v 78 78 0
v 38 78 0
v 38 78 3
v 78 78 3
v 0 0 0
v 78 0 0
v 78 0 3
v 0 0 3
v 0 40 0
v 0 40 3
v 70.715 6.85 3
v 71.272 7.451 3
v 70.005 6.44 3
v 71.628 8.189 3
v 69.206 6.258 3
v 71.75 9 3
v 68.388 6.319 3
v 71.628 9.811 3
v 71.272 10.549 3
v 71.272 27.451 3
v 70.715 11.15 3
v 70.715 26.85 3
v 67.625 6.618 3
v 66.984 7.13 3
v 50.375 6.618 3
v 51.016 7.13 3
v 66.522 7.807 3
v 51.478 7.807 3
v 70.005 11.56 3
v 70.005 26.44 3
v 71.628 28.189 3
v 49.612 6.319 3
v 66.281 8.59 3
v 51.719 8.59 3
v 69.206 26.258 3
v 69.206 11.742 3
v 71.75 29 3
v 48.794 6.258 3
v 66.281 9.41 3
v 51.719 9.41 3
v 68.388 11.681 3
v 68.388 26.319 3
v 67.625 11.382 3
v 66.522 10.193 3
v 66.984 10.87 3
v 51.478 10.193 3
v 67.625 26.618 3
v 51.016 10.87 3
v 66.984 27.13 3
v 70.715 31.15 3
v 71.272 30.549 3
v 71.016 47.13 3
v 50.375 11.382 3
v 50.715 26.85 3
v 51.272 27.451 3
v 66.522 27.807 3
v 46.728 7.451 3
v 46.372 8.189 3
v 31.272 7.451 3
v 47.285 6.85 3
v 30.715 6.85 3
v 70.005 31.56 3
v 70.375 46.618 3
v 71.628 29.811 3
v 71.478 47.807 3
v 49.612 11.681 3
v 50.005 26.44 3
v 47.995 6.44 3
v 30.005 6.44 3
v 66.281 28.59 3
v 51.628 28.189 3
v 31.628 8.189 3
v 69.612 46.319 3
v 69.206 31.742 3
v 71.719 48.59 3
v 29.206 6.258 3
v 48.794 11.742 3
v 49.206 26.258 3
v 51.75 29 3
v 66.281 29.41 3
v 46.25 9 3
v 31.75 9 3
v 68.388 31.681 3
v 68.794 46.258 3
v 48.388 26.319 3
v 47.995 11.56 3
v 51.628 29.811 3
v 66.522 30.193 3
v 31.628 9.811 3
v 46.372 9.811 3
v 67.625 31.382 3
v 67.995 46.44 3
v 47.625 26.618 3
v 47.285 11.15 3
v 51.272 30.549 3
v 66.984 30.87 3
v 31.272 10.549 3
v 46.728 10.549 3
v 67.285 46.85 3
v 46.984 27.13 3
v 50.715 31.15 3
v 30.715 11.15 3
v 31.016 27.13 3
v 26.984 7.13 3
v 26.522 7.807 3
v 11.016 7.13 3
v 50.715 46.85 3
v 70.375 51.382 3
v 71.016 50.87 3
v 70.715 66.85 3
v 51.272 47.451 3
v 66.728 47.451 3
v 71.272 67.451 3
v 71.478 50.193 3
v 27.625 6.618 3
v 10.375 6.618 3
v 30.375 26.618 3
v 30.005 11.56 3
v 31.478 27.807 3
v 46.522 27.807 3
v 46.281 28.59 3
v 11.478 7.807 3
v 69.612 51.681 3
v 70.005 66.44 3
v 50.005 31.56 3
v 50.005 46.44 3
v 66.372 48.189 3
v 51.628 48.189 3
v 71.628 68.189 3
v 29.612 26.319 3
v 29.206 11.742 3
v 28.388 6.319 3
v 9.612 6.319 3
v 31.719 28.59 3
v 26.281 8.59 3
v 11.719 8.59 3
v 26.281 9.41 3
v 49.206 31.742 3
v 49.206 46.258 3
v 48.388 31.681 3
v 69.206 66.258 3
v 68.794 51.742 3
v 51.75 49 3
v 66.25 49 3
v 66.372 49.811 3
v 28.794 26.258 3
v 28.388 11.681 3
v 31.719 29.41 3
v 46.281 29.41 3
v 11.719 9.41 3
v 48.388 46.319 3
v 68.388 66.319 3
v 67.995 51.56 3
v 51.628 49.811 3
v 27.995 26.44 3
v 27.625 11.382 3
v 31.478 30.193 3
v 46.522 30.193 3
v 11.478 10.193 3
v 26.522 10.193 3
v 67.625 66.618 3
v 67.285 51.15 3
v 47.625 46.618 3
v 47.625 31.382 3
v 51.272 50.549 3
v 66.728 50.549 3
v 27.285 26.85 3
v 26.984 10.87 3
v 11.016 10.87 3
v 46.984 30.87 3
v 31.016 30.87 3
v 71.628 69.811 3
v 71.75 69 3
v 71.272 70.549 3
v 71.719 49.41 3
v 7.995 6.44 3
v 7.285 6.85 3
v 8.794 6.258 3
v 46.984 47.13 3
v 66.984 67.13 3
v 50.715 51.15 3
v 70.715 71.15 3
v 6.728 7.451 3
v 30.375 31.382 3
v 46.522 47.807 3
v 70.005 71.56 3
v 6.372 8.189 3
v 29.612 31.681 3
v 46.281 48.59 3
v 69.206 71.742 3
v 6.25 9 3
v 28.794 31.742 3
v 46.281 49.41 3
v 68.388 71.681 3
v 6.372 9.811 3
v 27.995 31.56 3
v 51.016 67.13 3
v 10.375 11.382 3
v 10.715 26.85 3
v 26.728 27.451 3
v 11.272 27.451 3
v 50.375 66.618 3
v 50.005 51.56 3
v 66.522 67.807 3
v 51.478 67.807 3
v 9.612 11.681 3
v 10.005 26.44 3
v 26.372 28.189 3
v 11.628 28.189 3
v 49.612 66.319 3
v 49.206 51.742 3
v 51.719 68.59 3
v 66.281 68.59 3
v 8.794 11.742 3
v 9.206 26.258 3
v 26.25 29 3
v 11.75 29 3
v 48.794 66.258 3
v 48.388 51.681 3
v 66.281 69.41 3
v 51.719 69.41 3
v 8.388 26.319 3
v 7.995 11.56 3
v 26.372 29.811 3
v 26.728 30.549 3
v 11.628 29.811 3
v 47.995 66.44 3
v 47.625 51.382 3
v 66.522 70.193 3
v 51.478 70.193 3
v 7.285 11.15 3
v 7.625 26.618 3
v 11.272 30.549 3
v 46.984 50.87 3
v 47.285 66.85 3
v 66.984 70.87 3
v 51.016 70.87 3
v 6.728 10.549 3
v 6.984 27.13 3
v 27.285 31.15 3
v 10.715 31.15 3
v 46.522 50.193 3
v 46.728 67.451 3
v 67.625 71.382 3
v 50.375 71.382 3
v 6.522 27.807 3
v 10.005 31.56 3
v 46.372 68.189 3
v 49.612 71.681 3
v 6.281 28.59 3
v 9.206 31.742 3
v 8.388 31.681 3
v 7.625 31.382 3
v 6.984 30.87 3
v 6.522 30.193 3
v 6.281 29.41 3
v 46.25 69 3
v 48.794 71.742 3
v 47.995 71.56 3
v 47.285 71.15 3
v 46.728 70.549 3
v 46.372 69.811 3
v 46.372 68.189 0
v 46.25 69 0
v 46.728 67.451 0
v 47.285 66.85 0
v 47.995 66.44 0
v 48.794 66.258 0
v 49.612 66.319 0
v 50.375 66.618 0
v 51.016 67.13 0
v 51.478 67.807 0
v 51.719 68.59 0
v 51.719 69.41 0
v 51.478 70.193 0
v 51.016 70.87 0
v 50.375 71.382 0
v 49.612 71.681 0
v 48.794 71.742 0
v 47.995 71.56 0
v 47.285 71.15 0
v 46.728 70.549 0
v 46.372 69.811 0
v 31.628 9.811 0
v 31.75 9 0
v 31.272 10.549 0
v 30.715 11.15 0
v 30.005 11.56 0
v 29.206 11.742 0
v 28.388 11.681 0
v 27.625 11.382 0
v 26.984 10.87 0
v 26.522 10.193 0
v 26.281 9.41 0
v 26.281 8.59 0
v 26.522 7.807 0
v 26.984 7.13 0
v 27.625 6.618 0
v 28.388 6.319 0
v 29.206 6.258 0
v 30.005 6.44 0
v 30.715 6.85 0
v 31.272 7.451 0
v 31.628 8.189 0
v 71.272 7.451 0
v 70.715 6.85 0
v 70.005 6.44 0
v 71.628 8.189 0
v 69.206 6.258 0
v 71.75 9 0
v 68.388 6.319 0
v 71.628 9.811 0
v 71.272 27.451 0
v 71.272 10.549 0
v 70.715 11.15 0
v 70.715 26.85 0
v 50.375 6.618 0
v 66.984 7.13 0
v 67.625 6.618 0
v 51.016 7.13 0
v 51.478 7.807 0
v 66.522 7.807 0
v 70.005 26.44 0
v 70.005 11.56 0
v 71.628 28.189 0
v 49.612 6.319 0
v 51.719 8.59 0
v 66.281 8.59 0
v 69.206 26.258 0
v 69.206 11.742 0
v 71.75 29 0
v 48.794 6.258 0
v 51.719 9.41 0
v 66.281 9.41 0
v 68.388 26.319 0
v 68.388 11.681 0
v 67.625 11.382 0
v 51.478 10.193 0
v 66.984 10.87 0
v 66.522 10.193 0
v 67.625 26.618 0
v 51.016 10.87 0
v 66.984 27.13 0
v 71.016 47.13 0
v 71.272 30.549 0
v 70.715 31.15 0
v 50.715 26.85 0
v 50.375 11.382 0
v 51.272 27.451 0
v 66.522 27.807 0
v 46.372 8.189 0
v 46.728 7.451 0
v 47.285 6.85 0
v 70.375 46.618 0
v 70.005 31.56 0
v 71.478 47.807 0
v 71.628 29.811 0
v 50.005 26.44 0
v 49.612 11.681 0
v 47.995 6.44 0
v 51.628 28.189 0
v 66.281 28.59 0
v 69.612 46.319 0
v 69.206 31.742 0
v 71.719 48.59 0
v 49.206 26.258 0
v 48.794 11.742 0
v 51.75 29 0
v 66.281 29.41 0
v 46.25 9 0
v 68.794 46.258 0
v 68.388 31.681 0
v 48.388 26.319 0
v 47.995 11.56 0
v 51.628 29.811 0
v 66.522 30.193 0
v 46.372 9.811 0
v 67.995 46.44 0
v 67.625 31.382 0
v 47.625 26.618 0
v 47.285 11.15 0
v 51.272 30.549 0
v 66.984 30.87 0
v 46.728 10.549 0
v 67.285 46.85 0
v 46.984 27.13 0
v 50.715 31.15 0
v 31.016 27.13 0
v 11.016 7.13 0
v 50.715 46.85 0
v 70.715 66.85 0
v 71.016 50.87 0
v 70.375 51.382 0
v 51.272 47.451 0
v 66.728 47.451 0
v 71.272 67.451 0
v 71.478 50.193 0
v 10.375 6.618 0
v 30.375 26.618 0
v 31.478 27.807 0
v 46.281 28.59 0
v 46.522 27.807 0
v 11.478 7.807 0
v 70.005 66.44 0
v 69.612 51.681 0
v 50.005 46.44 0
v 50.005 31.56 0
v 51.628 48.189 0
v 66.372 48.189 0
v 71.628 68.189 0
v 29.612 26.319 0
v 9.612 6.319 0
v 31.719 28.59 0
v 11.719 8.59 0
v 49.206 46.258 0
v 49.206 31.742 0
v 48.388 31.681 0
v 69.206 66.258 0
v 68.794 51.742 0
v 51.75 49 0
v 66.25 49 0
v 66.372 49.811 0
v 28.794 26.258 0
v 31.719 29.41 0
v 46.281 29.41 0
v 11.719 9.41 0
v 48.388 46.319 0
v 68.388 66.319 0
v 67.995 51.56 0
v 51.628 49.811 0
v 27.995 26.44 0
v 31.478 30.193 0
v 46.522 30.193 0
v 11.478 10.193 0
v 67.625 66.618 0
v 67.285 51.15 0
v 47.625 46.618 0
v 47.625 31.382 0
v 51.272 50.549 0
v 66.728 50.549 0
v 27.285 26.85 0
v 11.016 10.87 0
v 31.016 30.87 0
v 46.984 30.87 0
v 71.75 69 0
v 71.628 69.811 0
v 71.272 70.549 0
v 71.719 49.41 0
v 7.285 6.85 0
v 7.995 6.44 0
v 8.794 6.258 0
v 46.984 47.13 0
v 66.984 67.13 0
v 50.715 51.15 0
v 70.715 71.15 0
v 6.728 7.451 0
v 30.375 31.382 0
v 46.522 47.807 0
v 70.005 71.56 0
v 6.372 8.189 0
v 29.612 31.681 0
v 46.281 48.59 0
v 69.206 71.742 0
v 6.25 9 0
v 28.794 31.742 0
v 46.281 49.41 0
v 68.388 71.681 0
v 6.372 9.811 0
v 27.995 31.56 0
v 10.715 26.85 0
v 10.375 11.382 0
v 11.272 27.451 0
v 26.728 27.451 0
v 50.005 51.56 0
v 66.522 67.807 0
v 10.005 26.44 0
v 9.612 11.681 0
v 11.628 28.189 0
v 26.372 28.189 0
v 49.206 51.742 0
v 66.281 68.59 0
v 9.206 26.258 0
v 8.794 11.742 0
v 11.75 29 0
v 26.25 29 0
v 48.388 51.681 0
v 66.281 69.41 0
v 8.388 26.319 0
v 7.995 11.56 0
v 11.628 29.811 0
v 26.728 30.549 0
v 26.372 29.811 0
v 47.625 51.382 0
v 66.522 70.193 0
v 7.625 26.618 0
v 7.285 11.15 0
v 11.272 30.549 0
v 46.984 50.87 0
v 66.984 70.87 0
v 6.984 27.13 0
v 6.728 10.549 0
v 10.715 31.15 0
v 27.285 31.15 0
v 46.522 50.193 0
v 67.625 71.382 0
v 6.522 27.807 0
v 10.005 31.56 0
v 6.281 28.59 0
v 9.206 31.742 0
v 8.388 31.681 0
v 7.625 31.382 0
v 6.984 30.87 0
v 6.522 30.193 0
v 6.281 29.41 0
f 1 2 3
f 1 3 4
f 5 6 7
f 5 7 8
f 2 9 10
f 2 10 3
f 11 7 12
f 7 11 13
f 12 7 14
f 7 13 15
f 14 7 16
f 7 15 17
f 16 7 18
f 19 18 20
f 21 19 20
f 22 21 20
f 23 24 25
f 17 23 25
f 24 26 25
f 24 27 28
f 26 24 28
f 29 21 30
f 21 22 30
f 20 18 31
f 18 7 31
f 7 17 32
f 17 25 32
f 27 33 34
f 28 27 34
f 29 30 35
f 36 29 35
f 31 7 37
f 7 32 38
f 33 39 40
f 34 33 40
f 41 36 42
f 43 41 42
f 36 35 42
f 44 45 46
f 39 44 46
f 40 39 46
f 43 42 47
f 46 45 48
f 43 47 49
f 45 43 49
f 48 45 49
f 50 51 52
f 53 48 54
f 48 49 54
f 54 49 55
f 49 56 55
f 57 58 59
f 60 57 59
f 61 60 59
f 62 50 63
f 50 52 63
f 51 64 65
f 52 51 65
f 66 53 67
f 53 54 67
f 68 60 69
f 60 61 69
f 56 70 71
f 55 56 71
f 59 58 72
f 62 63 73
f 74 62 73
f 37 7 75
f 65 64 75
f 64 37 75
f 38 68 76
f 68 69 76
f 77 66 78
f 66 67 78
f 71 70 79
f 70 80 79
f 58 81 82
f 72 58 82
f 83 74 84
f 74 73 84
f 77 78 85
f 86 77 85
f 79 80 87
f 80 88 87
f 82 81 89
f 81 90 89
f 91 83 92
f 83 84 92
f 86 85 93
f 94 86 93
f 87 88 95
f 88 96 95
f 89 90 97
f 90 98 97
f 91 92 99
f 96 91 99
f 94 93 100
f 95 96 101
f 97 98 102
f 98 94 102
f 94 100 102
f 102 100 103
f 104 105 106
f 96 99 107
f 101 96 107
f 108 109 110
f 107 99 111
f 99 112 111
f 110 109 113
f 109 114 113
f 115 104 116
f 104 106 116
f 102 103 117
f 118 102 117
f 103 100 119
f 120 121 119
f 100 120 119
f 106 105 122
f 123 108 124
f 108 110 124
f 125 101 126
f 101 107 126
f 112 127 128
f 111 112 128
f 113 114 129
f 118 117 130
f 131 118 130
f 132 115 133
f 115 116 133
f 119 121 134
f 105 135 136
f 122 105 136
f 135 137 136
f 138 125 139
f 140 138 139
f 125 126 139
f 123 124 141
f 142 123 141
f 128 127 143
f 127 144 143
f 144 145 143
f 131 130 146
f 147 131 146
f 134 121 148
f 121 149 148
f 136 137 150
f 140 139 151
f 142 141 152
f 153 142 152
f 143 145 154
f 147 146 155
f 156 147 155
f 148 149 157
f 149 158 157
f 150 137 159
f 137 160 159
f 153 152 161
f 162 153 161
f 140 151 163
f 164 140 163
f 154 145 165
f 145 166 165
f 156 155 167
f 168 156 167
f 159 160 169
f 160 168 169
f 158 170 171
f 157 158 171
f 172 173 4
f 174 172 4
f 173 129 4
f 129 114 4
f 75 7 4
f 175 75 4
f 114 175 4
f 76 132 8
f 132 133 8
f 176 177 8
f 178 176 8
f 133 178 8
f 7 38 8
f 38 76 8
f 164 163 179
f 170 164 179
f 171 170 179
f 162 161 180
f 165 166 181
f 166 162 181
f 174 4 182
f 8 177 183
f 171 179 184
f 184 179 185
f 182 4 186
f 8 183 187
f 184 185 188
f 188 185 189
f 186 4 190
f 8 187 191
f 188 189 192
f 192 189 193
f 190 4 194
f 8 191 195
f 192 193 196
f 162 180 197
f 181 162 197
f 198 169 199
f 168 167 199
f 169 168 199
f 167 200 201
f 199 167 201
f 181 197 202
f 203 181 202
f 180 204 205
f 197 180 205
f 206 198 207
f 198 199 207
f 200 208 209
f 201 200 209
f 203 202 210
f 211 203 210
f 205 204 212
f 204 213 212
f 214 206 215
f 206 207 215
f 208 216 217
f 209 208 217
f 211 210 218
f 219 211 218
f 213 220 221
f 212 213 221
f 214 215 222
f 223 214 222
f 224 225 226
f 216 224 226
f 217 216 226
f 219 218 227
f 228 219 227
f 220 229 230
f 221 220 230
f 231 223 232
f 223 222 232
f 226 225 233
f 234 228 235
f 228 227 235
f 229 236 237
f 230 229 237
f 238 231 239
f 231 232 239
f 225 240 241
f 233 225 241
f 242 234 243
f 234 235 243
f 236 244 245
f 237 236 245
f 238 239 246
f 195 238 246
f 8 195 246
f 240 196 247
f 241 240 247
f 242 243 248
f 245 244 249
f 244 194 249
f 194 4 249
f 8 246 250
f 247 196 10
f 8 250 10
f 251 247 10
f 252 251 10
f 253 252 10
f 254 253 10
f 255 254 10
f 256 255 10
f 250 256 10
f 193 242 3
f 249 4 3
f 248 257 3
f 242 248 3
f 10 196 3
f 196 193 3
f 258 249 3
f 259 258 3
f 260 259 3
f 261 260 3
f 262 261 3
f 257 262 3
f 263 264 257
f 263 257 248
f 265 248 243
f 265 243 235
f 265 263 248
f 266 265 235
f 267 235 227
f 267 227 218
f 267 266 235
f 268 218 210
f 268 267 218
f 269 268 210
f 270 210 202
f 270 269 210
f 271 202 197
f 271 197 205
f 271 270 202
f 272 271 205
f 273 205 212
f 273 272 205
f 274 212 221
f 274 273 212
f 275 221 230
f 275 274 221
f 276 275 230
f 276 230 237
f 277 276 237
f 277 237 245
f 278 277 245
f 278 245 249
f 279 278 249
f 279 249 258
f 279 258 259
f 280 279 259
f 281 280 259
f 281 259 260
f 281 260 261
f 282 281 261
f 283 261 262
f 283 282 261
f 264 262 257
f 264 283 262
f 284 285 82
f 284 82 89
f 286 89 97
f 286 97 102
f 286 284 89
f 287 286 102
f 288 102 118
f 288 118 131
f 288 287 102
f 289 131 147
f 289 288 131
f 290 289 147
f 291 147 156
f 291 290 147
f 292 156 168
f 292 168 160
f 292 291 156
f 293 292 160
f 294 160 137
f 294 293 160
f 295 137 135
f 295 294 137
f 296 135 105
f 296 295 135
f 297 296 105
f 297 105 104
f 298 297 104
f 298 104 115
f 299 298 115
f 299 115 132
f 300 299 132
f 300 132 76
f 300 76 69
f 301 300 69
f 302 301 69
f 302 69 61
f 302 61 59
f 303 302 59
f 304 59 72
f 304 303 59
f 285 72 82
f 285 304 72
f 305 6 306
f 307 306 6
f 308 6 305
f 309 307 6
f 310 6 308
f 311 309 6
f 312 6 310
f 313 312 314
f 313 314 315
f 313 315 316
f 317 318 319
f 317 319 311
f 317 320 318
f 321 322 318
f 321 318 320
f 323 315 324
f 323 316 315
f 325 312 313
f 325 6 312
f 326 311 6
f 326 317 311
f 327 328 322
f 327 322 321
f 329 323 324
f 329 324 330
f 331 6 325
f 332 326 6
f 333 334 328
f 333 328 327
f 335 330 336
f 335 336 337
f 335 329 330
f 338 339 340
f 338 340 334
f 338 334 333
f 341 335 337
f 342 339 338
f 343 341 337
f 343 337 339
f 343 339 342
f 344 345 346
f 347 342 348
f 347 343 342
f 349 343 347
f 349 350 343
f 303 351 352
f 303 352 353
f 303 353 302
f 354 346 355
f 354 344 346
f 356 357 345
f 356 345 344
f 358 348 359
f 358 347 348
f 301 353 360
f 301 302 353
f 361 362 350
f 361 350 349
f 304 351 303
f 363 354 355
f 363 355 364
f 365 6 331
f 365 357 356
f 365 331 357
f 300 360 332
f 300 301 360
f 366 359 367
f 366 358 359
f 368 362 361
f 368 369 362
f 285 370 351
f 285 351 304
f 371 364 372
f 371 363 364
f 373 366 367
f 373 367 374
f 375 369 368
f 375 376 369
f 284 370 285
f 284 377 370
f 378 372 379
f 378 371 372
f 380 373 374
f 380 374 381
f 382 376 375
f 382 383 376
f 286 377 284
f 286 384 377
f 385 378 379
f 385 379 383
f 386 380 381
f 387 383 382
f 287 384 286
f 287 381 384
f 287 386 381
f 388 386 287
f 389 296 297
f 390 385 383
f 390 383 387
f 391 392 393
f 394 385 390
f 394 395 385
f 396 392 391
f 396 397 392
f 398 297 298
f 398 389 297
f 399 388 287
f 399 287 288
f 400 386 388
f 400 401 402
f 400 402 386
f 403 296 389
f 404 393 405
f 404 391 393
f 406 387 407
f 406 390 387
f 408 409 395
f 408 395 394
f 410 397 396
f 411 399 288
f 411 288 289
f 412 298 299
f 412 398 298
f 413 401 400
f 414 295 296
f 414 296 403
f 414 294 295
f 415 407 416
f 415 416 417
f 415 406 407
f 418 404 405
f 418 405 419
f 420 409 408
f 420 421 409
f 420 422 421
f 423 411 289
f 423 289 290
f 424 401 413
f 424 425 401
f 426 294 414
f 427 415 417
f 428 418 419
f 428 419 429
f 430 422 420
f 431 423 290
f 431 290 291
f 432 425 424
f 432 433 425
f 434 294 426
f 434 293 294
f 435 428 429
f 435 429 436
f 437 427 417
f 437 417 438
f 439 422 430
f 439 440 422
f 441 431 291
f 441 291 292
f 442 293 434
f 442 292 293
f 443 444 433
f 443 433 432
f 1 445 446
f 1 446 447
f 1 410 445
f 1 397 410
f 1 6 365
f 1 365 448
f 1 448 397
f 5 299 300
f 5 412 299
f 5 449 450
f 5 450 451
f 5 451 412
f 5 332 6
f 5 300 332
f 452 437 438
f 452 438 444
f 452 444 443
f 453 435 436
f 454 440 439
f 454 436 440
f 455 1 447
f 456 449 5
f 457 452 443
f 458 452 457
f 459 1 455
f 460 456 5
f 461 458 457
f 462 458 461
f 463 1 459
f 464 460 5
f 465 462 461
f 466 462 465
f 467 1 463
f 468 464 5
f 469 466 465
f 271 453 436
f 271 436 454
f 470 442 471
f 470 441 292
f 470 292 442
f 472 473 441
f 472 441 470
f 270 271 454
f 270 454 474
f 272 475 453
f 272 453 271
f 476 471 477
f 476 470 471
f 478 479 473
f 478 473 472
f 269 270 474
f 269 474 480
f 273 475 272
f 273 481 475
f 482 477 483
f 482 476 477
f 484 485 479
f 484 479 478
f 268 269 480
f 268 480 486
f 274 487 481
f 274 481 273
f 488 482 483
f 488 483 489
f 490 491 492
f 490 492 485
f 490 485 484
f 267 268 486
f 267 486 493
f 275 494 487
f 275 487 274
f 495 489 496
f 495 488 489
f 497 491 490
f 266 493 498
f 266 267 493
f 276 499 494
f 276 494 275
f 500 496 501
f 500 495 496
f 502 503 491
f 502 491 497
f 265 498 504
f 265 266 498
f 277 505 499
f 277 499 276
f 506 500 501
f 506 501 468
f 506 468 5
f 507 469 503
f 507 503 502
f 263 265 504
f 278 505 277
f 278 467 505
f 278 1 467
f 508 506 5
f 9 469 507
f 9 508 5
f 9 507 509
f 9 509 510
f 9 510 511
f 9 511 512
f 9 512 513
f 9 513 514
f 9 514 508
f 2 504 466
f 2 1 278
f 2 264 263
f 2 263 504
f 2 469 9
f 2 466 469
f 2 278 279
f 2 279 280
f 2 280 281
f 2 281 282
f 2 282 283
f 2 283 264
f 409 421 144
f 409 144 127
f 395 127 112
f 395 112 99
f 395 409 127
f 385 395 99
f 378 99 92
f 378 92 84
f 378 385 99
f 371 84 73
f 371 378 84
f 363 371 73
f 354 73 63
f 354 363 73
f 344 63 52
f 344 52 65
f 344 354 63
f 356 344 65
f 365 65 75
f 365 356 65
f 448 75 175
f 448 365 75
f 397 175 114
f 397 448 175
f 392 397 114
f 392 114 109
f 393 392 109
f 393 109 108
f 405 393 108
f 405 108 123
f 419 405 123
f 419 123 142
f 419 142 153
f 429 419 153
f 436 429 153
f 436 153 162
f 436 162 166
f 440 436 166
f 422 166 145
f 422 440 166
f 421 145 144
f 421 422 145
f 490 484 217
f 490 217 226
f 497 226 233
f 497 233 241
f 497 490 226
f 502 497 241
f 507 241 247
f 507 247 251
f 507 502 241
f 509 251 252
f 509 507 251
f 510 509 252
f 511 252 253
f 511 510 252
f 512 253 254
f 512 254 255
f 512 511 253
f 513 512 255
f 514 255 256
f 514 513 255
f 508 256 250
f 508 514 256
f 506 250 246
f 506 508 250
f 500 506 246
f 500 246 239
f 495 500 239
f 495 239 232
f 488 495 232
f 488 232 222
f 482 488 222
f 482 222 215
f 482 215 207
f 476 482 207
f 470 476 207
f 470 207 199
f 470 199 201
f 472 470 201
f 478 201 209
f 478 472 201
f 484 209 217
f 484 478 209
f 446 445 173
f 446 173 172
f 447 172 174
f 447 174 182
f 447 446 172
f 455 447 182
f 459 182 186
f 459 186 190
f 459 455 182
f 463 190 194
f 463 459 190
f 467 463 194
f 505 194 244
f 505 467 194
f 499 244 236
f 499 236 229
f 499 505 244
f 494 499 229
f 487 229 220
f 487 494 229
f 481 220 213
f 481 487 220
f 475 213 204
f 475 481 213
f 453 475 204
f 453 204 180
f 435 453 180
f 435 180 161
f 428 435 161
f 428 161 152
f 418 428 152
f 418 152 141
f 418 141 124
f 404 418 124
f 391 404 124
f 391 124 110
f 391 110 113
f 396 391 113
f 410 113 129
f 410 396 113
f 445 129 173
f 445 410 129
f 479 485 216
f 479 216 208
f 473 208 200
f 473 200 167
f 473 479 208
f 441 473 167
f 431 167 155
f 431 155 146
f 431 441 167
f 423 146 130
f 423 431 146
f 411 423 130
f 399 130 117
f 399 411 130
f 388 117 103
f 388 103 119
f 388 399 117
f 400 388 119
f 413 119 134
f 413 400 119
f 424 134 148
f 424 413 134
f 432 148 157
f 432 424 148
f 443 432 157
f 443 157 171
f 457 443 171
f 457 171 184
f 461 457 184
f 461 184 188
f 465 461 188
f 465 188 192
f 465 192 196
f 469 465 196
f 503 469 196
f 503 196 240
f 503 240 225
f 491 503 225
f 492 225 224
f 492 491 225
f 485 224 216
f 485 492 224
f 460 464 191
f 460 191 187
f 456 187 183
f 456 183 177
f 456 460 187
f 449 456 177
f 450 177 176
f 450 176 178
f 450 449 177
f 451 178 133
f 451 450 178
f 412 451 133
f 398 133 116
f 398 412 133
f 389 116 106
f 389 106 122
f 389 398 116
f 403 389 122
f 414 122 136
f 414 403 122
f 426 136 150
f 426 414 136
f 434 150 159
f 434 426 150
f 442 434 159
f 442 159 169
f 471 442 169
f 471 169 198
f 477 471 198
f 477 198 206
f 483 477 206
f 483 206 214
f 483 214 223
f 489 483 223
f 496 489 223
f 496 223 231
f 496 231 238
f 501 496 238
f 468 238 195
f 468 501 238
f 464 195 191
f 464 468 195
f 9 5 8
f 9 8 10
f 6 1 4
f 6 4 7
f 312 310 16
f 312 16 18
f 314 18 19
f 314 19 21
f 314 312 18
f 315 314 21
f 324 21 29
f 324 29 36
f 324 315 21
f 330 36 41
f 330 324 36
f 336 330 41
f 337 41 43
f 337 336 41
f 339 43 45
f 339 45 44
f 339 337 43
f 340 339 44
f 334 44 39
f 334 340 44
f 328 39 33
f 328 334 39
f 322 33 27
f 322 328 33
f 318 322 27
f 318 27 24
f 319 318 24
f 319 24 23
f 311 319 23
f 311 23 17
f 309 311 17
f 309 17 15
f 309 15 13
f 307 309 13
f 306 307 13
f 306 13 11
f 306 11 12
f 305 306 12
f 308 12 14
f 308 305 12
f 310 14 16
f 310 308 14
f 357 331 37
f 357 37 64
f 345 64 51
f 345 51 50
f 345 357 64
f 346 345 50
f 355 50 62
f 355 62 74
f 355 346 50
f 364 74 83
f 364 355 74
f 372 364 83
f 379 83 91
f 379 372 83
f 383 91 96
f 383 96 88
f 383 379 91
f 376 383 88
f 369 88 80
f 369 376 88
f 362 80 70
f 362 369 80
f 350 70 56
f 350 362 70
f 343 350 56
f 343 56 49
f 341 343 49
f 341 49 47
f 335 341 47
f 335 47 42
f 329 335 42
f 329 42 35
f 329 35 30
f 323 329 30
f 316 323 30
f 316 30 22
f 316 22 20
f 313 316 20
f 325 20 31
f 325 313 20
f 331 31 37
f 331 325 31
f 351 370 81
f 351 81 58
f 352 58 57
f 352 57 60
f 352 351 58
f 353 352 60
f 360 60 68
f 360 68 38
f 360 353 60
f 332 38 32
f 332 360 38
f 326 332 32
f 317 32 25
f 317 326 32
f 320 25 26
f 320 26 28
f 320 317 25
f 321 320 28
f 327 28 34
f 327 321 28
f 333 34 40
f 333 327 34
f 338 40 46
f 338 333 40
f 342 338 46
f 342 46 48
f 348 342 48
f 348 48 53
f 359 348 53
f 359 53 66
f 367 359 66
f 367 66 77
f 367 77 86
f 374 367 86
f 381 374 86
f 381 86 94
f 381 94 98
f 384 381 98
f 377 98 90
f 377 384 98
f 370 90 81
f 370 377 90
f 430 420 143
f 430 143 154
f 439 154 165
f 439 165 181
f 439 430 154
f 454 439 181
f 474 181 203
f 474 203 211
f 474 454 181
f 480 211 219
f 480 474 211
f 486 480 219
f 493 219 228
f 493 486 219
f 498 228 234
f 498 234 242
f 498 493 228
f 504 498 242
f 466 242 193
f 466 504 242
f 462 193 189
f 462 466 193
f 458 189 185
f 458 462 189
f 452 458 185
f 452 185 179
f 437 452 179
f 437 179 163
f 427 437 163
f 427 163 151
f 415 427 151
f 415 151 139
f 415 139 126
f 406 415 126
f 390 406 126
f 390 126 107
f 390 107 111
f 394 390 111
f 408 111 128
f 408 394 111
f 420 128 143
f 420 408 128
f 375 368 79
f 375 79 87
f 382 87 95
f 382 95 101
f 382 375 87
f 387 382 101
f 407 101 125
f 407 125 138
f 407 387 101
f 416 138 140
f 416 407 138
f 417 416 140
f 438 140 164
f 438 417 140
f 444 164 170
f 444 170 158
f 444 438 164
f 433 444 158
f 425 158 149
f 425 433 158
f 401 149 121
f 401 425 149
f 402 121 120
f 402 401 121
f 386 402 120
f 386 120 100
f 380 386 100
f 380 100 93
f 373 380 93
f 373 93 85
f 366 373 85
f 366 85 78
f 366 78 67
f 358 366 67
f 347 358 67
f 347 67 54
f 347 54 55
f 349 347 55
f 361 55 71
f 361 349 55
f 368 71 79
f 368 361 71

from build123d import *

# Parameters (mm, degrees)
ESQUISSE1_R        = 2.75
BOSS_EXTRU_1_DEPTH = 3


with BuildPart() as part:
    # Esquisse1 → Boss.-Extru.1 (new body)
    with BuildSketch(Plane.XY):
        Polygon((0, 0), (0, 40), (38, 78), (78, 78), (78, 0), align=None)
        with Locations((9, 29)):
            Circle(ESQUISSE1_R, mode=Mode.SUBTRACT)
        with Locations(Location((9, 9, 0), (0, 0, 180))):
            Circle(ESQUISSE1_R, mode=Mode.SUBTRACT)
        with Locations((29, 9)):
            Circle(ESQUISSE1_R, mode=Mode.SUBTRACT)
        with Locations(Location((29, 29, 0), (0, 0, 180))):
            Circle(ESQUISSE1_R, mode=Mode.SUBTRACT)
        with Locations((49, 29)):
            Circle(ESQUISSE1_R, mode=Mode.SUBTRACT)
        with Locations(Location((49, 9, 0), (0, 0, 180))):
            Circle(ESQUISSE1_R, mode=Mode.SUBTRACT)
        with Locations((69, 9)):
            Circle(ESQUISSE1_R, mode=Mode.SUBTRACT)
        with Locations((69, 29)):
            Circle(ESQUISSE1_R, mode=Mode.SUBTRACT)
        with Locations((49, 49)):
            Circle(ESQUISSE1_R, mode=Mode.SUBTRACT)
        with Locations(Location((69, 49, 0), (0, 0, 180))):
            Circle(ESQUISSE1_R, mode=Mode.SUBTRACT)
        with Locations((69, 69)):
            Circle(ESQUISSE1_R, mode=Mode.SUBTRACT)
        with Locations(Location((49, 69, 0), (0, 0, 180))):
            Circle(ESQUISSE1_R, mode=Mode.SUBTRACT)
    extrude(amount=BOSS_EXTRU_1_DEPTH)


solid = part.part
